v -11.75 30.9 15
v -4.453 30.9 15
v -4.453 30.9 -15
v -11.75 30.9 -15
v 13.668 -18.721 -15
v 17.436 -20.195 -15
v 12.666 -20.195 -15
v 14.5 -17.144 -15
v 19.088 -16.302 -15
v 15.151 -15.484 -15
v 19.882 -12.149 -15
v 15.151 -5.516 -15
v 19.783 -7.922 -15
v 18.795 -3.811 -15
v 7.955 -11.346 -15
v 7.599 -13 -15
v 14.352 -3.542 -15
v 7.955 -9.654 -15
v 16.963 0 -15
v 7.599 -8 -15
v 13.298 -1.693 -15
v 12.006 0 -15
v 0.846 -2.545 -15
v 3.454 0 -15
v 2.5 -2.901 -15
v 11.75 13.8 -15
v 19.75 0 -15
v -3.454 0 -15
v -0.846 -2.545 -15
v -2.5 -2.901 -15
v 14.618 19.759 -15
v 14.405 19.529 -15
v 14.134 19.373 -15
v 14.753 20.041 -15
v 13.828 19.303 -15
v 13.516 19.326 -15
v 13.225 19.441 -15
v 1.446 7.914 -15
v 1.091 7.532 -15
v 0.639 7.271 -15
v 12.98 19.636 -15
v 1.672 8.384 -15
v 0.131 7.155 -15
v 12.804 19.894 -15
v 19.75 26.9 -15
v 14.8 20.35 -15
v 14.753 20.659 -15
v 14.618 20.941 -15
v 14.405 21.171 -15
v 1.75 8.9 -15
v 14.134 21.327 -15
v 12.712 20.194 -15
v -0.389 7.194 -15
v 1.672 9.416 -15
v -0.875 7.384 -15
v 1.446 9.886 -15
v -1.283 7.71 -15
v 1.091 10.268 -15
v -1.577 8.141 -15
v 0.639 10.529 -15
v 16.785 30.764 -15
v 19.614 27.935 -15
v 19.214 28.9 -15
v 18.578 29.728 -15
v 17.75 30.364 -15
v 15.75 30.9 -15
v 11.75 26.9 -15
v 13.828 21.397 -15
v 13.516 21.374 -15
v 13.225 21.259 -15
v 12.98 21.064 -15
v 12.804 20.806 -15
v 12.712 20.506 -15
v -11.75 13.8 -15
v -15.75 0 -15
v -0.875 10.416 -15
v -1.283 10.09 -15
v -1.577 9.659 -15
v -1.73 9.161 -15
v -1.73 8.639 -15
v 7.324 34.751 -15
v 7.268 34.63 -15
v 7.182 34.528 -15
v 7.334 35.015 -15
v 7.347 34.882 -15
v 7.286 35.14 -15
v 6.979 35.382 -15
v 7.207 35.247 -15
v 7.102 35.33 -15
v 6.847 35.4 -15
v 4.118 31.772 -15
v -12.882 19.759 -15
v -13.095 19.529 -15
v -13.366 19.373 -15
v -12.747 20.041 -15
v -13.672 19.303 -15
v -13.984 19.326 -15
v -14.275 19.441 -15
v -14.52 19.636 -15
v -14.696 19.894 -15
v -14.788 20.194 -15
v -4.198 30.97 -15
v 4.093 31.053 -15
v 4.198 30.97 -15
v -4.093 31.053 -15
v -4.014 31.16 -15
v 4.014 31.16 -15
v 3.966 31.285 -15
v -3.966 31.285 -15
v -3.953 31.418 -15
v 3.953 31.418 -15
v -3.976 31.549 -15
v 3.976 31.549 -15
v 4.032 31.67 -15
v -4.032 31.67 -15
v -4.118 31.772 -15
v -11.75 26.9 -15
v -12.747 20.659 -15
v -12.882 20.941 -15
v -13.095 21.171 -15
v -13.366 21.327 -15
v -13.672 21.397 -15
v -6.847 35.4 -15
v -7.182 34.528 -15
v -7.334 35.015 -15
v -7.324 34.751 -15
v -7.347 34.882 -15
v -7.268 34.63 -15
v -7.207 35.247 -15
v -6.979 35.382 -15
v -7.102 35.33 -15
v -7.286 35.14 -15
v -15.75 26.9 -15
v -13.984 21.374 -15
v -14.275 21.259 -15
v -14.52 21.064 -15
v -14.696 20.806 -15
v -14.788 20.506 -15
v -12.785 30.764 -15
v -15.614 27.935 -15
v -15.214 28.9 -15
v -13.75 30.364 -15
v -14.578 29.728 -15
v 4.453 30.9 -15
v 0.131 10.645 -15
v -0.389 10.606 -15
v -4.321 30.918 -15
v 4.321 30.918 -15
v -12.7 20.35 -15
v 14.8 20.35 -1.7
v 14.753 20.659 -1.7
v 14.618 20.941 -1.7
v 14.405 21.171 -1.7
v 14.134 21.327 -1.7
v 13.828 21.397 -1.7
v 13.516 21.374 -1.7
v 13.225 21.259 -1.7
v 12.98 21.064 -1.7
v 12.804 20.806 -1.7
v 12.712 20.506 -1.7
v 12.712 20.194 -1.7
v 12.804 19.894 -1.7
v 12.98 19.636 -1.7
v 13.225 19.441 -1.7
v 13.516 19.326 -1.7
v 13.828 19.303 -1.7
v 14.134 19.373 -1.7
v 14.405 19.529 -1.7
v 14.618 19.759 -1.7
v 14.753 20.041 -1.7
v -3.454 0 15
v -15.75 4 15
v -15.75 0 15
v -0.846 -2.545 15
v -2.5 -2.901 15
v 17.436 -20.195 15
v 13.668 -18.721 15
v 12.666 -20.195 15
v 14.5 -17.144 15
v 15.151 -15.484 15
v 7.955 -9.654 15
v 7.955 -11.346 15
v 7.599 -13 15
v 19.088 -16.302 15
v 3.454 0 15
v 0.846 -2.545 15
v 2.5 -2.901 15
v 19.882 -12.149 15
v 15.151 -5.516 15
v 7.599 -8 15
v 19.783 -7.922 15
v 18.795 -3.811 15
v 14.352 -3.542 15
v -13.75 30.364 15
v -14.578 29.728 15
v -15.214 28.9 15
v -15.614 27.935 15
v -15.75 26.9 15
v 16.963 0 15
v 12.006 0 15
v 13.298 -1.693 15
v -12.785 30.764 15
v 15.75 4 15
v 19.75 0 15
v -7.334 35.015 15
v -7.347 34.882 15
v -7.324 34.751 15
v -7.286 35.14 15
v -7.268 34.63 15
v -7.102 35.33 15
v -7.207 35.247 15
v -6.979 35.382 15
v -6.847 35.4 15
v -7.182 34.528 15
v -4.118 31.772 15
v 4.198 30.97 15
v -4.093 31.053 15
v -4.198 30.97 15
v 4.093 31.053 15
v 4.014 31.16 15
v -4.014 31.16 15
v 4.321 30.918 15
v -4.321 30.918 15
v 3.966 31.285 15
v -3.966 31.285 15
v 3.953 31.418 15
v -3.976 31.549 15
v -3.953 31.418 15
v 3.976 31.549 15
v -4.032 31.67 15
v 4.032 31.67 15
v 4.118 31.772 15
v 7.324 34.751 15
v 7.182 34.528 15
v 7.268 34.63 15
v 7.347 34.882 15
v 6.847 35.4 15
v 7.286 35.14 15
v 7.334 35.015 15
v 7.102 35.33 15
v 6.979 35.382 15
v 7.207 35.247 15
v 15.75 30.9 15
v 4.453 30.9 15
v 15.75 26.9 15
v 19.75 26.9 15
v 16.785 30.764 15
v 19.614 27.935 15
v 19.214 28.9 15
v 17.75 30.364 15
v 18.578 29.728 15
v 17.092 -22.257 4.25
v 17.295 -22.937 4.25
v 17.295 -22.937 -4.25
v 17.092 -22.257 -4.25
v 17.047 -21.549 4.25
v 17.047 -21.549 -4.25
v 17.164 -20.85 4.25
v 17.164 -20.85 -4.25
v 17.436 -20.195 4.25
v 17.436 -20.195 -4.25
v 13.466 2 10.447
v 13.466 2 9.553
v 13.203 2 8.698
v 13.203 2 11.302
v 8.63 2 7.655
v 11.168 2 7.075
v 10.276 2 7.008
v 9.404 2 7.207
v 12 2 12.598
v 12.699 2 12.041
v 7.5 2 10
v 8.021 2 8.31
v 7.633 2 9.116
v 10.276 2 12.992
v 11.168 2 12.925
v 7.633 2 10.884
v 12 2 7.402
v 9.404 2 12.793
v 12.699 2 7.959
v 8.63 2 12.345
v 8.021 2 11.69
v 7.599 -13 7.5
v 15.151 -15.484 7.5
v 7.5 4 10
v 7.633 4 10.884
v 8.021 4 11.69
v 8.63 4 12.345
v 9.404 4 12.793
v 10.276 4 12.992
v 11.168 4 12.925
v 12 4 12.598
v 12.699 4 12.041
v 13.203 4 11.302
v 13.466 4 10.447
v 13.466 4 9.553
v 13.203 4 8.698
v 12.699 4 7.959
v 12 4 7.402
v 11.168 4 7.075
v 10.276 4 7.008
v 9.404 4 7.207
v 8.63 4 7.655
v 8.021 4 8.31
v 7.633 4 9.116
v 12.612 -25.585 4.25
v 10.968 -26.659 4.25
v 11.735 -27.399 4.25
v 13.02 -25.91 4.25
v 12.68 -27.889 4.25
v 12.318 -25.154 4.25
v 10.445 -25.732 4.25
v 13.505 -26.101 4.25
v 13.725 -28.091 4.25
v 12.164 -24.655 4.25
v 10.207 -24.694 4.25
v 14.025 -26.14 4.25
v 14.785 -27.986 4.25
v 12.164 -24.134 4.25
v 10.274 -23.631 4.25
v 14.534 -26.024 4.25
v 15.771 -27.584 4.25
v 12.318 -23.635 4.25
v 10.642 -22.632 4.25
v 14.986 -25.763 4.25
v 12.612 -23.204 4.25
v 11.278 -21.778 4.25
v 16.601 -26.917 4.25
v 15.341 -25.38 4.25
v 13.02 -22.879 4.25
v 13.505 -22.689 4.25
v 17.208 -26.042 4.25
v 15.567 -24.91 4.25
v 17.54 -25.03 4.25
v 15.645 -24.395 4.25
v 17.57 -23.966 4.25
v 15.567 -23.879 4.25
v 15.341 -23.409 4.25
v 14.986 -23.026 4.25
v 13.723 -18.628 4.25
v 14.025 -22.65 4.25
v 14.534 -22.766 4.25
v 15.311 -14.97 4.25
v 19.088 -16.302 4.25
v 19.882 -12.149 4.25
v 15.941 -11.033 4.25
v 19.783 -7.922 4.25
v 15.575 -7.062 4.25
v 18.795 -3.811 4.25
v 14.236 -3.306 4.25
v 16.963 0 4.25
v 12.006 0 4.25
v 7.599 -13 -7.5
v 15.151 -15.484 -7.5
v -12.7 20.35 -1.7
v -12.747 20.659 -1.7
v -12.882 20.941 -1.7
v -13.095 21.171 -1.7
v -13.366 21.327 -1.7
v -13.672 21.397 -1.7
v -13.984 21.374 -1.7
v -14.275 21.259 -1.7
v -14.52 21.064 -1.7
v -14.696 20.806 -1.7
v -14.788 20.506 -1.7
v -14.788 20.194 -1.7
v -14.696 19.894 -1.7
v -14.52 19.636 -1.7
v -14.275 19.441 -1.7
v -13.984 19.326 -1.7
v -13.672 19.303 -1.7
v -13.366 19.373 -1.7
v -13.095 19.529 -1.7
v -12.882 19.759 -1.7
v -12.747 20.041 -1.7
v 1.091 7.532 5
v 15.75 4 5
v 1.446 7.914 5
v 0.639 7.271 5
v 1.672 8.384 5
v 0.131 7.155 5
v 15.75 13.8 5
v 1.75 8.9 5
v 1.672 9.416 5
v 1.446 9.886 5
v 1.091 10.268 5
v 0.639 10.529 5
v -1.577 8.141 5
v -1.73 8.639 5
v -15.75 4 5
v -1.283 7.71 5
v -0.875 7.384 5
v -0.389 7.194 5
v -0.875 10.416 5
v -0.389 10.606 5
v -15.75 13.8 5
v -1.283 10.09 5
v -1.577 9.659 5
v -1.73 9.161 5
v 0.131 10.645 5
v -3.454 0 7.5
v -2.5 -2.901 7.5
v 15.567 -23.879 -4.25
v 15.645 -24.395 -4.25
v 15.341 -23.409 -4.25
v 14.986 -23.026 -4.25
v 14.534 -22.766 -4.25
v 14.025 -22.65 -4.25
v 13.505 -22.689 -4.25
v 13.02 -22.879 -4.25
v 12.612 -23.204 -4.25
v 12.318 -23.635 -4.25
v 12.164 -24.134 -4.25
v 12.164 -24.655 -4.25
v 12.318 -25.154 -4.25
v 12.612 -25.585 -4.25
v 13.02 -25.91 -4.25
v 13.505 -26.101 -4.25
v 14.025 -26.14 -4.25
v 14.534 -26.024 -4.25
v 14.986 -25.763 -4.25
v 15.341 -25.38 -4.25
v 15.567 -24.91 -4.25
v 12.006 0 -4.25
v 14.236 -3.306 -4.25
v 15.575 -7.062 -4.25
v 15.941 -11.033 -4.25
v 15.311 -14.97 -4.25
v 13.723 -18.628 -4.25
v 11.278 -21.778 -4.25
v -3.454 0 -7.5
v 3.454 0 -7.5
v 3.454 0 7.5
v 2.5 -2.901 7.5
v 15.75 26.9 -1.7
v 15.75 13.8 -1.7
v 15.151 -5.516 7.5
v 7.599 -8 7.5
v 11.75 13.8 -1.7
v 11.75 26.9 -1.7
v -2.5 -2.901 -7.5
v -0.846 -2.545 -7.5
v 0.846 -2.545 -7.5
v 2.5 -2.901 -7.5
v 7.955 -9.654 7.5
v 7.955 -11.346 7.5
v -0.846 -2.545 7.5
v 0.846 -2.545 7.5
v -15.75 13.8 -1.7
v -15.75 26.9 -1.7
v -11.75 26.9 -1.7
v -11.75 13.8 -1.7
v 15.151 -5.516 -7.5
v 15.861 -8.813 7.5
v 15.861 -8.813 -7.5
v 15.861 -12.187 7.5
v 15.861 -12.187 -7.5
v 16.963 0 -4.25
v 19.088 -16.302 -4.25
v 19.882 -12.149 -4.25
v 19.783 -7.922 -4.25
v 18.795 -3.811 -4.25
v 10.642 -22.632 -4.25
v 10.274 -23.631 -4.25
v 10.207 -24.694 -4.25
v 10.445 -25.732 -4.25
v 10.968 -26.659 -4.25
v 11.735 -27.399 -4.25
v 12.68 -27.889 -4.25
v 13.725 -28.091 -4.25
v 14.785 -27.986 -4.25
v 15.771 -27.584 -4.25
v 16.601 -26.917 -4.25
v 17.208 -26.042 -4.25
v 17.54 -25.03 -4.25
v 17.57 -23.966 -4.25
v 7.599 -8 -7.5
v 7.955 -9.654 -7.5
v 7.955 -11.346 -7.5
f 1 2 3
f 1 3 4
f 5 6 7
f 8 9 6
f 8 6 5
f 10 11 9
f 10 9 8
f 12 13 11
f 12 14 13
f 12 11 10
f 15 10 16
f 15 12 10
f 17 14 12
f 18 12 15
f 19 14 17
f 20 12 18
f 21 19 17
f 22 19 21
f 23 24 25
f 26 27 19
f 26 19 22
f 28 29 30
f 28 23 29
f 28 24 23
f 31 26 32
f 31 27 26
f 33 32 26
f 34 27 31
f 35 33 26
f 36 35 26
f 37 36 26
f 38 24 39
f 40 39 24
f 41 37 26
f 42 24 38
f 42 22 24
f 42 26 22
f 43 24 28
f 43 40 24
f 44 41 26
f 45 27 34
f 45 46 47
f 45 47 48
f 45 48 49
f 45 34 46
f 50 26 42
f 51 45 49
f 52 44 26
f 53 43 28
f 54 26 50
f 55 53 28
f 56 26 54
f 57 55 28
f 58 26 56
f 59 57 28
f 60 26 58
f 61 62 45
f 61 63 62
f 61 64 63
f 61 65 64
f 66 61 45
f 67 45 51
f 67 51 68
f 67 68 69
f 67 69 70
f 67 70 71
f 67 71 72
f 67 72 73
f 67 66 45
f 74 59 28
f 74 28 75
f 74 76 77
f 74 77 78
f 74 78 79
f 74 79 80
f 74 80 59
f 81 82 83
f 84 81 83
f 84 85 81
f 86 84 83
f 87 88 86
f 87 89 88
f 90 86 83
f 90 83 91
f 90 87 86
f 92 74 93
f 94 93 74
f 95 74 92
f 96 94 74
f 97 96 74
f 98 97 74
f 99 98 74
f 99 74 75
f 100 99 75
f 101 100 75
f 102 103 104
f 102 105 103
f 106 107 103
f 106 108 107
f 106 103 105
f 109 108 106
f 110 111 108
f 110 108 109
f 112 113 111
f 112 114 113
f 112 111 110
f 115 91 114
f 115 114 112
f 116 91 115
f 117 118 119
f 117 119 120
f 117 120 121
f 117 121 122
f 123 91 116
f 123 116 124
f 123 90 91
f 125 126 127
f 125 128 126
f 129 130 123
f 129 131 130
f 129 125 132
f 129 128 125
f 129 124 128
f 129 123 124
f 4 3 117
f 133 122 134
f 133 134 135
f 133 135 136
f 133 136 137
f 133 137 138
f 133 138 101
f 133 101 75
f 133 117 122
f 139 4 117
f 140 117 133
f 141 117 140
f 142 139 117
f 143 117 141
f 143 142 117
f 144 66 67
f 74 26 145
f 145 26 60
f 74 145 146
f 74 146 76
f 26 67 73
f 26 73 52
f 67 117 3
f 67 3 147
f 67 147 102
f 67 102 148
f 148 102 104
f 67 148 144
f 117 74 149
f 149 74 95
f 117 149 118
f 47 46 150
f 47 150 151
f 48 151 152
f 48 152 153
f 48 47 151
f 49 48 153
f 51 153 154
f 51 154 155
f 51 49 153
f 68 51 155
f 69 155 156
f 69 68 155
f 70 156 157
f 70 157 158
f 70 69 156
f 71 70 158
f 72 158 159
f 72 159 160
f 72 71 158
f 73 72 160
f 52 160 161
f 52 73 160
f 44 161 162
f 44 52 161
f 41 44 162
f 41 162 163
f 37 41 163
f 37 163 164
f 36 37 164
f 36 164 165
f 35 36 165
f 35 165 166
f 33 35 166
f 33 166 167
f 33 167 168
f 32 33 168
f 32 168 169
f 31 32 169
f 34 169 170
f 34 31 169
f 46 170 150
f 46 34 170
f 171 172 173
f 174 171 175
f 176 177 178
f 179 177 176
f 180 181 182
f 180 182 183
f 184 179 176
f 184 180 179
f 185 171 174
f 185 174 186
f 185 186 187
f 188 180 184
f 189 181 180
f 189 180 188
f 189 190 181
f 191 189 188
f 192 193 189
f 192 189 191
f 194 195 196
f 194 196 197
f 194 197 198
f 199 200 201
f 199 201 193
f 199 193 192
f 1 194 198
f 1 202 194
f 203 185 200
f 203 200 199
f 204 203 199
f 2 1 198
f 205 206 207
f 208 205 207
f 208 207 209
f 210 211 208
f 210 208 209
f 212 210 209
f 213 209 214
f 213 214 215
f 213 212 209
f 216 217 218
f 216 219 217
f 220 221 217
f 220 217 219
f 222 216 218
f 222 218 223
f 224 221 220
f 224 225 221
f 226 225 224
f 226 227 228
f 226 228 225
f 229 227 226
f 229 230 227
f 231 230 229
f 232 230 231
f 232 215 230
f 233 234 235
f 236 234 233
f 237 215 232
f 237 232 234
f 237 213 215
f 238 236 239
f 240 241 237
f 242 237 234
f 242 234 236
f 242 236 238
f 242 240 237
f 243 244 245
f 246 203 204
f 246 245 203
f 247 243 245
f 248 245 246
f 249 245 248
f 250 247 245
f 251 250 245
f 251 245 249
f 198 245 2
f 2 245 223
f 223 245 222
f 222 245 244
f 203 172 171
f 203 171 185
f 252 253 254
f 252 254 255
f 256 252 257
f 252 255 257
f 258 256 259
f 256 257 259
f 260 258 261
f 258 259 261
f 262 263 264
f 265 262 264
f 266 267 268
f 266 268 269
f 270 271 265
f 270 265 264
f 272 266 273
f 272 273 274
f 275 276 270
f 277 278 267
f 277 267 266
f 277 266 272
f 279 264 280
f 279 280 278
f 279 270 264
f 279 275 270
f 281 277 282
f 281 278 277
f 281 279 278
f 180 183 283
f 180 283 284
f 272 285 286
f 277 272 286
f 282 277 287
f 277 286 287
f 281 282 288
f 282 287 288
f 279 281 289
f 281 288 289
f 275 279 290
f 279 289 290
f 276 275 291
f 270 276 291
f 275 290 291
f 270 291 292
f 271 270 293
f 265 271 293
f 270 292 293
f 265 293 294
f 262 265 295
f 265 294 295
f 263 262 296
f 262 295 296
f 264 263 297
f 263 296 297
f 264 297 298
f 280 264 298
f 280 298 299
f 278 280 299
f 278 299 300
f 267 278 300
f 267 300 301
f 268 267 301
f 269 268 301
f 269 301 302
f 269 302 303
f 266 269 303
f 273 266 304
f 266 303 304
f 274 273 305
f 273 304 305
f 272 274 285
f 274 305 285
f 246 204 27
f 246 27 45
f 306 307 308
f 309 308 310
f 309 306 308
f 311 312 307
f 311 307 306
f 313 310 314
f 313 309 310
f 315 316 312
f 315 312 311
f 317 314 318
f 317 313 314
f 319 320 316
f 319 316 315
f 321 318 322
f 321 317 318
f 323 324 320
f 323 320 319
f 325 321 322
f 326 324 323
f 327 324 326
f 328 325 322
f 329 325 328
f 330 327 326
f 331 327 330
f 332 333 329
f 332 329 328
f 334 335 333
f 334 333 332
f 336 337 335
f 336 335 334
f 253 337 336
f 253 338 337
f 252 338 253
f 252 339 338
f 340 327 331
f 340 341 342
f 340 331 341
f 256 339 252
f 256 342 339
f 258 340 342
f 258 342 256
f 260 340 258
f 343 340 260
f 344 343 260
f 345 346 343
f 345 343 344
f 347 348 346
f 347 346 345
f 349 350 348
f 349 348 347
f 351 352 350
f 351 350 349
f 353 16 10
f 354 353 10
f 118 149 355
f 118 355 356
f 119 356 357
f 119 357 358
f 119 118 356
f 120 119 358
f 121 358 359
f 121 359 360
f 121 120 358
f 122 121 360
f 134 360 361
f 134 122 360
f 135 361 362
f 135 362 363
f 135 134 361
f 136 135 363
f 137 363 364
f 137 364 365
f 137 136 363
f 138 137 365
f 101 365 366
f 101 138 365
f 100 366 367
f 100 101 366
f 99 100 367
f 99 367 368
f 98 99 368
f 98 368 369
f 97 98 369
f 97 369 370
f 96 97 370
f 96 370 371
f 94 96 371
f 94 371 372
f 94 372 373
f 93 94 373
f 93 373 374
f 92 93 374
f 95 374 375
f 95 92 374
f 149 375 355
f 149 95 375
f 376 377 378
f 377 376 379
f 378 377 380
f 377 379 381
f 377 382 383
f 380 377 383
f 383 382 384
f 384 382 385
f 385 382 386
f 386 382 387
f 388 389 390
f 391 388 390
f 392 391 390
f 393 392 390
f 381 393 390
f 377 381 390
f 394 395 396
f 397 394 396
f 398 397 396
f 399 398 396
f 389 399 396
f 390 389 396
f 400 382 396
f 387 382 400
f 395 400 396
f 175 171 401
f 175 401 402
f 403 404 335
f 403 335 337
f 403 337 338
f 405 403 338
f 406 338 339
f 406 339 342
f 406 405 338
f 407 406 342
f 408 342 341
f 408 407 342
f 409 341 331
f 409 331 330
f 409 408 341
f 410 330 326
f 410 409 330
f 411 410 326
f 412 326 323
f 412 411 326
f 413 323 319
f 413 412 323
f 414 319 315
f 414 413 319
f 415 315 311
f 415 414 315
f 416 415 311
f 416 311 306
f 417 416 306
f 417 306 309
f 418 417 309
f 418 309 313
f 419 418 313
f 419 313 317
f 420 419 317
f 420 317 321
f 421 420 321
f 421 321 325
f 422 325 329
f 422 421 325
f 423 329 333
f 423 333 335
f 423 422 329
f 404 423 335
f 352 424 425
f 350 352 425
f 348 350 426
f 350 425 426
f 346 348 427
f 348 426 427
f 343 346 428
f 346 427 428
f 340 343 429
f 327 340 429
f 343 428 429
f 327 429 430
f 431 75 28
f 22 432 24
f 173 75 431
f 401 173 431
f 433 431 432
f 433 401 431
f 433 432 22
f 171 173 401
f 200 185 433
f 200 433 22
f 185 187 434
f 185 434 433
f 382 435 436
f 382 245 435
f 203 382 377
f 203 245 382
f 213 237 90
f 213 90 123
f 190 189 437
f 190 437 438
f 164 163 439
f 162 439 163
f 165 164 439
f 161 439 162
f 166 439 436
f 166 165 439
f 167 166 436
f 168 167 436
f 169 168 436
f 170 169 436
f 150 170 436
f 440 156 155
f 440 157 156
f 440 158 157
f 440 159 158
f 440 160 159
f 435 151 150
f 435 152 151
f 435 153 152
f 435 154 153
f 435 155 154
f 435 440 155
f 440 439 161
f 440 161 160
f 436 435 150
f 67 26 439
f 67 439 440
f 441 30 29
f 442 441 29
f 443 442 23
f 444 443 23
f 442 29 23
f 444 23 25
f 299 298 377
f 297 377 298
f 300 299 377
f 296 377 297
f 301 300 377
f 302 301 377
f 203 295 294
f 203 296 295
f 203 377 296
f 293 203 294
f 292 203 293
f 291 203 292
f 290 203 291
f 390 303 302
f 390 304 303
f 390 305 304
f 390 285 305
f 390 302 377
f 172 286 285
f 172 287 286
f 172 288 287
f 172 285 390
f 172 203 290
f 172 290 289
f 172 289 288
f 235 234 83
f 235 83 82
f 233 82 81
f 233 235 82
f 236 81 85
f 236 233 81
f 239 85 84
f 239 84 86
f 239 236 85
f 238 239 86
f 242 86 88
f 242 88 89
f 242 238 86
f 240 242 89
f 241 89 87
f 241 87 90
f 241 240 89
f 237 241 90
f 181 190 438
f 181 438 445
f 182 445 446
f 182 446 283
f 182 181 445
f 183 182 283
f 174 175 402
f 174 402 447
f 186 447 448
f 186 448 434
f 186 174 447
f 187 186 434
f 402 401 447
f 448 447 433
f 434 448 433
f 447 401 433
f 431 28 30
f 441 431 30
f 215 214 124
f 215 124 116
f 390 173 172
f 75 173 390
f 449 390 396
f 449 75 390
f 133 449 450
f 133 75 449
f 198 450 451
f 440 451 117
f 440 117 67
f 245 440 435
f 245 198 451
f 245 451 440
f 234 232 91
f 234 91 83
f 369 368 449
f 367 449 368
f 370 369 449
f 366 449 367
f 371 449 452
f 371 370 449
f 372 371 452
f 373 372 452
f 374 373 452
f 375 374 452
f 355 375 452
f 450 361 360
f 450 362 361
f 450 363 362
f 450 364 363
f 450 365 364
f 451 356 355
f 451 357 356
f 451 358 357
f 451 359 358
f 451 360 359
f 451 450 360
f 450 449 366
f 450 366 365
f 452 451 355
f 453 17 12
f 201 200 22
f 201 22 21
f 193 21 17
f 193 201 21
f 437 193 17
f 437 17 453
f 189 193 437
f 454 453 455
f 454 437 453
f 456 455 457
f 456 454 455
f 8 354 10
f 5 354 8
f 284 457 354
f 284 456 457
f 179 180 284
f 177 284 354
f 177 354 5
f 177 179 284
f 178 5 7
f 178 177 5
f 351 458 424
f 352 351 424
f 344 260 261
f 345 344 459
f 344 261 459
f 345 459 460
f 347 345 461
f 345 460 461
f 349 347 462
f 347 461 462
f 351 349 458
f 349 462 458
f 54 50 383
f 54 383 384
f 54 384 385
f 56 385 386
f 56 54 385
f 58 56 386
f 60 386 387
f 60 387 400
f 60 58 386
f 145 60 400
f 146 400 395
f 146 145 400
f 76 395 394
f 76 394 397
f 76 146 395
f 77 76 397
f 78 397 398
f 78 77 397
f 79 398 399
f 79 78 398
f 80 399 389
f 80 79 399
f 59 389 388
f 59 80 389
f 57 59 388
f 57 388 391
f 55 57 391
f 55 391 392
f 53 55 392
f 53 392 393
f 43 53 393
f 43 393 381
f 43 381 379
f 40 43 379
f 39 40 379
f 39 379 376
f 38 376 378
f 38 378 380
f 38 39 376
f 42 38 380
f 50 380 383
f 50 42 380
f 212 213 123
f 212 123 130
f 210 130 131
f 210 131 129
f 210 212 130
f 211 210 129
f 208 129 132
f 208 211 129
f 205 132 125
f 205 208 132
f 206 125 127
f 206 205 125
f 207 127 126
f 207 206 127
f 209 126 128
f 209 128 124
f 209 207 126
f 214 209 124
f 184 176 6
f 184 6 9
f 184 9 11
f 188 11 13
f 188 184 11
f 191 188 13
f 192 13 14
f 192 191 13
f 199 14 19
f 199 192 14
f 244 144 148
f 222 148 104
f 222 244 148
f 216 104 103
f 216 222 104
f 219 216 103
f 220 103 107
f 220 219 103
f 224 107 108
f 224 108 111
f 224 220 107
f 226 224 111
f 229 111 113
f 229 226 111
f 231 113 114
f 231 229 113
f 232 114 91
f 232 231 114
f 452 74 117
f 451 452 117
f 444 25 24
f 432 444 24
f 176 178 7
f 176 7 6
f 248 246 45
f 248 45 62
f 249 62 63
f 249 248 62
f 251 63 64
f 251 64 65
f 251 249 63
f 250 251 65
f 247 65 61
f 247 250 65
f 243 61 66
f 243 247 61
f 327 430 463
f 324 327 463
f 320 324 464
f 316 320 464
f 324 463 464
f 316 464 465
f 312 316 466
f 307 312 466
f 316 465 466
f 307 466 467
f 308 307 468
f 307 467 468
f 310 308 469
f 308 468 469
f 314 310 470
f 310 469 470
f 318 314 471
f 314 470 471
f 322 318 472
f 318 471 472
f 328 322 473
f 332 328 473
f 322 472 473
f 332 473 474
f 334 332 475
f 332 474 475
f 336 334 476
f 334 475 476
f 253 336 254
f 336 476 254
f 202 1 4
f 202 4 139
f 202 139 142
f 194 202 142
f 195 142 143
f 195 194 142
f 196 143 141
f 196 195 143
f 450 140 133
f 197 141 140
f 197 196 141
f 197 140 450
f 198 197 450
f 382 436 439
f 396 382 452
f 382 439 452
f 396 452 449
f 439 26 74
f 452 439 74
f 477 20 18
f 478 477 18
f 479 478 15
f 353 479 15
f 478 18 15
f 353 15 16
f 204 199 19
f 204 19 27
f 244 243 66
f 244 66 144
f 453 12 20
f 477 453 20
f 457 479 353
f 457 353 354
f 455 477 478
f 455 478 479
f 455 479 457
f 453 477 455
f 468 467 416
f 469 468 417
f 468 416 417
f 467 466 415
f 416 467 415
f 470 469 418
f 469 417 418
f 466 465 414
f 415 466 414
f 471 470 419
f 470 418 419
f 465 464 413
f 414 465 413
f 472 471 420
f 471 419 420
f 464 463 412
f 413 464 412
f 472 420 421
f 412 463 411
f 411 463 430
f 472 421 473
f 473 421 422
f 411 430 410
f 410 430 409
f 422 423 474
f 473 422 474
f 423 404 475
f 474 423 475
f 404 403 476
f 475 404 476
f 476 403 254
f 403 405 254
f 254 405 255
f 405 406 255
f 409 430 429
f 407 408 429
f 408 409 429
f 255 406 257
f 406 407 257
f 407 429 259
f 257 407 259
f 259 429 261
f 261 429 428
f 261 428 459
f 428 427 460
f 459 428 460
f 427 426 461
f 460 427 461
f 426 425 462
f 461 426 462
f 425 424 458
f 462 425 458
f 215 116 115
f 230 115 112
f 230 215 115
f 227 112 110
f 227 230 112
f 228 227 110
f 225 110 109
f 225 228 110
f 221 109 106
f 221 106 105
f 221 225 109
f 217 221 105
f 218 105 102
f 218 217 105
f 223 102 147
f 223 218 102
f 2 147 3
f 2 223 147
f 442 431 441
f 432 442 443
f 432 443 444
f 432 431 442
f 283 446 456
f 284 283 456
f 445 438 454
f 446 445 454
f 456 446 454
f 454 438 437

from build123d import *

# Parameters (mm, degrees)
EXTRUDE_1_DEPTH     = 15
EXTRUDE_START       = -4.25
EXTRUDE_2_OUTLINE_R = 1.75
EXTRUDE_2_DEPTH     = 8.5
EXTRUDE_START_2     = -15
SKETCH_1_4_W        = 4
SKETCH_1_4_H        = 13.1
SKETCH_1_4_R        = 1.05
EXTRUDE_3_DEPTH     = 13.3
SKETCH_1_6_R        = 1.75
EXTRUDE_5_DEPTH     = 20
EXTRUDE_START_3     = 15
EXTRUDE_6_DEPTH     = 7.5
EXTRUDE_7_DEPTH     = 7.5
SKETCH_2_R          = 3
CUT_EXTRUDE_1_DEPTH = 2


# Read off the part's stored shape, not the designer's step: Бобышка-Вытянуть2
with BuildPart() as part:
    # Эскиз1 → Бобышка-Вытянуть1 (new, symmetric)
    with BuildSketch(Plane.XY):
        with BuildLine():
            Line((-15.75, 4), (-15.75, 0))
            Line((-15.75, 0), (12.006352485, 0))
            ThreePointArc((12.006352485, 0), (15.941509182, -9.979629936), (12.665555468, -20.19464825))
            Line((12.665555468, -20.19464825), (17.436063068, -20.19464825))
            ThreePointArc((17.436063068, -20.19464825), (19.944534806, -10.033061691), (16.963269142, 0))
            Line((16.963269142, 0), (19.75, 0))
            Line((19.75, 0), (19.75, 26.9))
            ThreePointArc((19.75, 26.9), (18.578427125, 29.728427125), (15.75, 30.9))
            Line((15.75, 30.9), (4.452979114, 30.9))
            ThreePointArc((4.452979114, 30.9), (3.986168908, 31.220868116), (4.118496748, 31.771647073))
            Line((4.118496748, 31.771647073), (7.181503252, 34.528352927))
            ThreePointArc((7.181503252, 34.528352927), (7.313831092, 35.079131884), (6.847020886, 35.4))
            Line((6.847020886, 35.4), (-6.847020886, 35.4))
            ThreePointArc((-6.847020886, 35.4), (-7.313831092, 35.079131884), (-7.181503252, 34.528352927))
            Line((-7.181503252, 34.528352927), (-4.118496748, 31.771647073))
            ThreePointArc((-4.118496748, 31.771647073), (-3.986168908, 31.220868116), (-4.452979114, 30.9))
            Line((-4.452979114, 30.9), (-11.75, 30.9))
            ThreePointArc((-11.75, 30.9), (-14.578427125, 29.728427125), (-15.75, 26.9))
            Line((-15.75, 26.9), (15.75, 26.9))
            Line((15.75, 26.9), (15.75, 4))
            Line((15.75, 4), (-15.75, 4))
        make_face()
    extrude(amount=EXTRUDE_1_DEPTH, both=True)

    # Эскиз1<4> → Бобышка-Вытянуть3 (add)
    # profile 1 of 2: a face of its own
    with BuildSketch(Plane.XY.offset(EXTRUDE_START_2)):
        with Locations((-13.75, 20.35)):
            Rectangle(SKETCH_1_4_W, SKETCH_1_4_H)
        with Locations((-13.75, 20.35)):
            Circle(SKETCH_1_4_R, mode=Mode.SUBTRACT)
    # profile 2 of 2: a face of its own
    with BuildSketch(Plane.XY.offset(EXTRUDE_START_2)):
        with Locations((13.75, 20.35)):
            Rectangle(SKETCH_1_4_W, SKETCH_1_4_H)
        with Locations((13.75, 20.35)):
            Circle(SKETCH_1_4_R, mode=Mode.SUBTRACT)
    extrude(amount=EXTRUDE_3_DEPTH)

    # Эскиз1<6> → Бобышка-Вытянуть5 (add)
    with BuildSketch(Plane.XY.offset(EXTRUDE_START_2)):
        Polygon((-11.75, 13.8), (11.75, 13.8), (15.75, 13.8), (15.75, 4), (-15.75, 4), (-15.75, 13.8), align=None)
        with Locations((0, 8.9)):
            Circle(SKETCH_1_6_R, mode=Mode.SUBTRACT)
    extrude(amount=EXTRUDE_5_DEPTH)

    # Эскиз1<7> → Бобышка-Вытянуть6 (add)
    with BuildSketch(Plane.XY.offset(EXTRUDE_START_3)):
        with BuildLine():
            Line((3.454246399, 0), (-3.454246399, 0))
            Line((-3.454246399, 0), (-2.5, -2.900657923))
            ThreePointArc((-2.5, -2.900657923), (0, -2.5), (2.5, -2.900657923))
            Line((2.5, -2.900657923), (3.454246399, 0))
        make_face()
        with BuildLine():
            ThreePointArc((15.151188266, -15.484375), (15.95, -10.5), (15.151188266, -5.515625))
            Line((15.151188266, -5.515625), (7.599342077, -8))
            ThreePointArc((7.599342077, -8), (8, -10.5), (7.599342077, -13))
            Line((7.599342077, -13), (15.151188266, -15.484375))
        make_face()
    extrude(amount=-EXTRUDE_6_DEPTH)

    # Эскиз1<8> → Бобышка-Вытянуть7 (add)
    with BuildSketch(Plane.XY.offset(EXTRUDE_START_2)):
        with BuildLine():
            Line((3.454246399, 0), (-3.454246399, 0))
            Line((-3.454246399, 0), (-2.5, -2.900657923))
            ThreePointArc((-2.5, -2.900657923), (0, -2.5), (2.5, -2.900657923))
            Line((2.5, -2.900657923), (3.454246399, 0))
        make_face()
        with BuildLine():
            ThreePointArc((15.151188266, -15.484375), (15.95, -10.5), (15.151188266, -5.515625))
            Line((15.151188266, -5.515625), (7.599342077, -8))
            ThreePointArc((7.599342077, -8), (8, -10.5), (7.599342077, -13))
            Line((7.599342077, -13), (15.151188266, -15.484375))
        make_face()
    extrude(amount=EXTRUDE_7_DEPTH)

    # Эскиз2 → Вырез-Вытянуть1 (cut)
    with BuildSketch(Plane(origin=(0, 4, 0), x_dir=(1, 0, 0), z_dir=(0, 1, 0))):
        with Locations(Location((10.5, -10, 0), (0, 0, 180))):
            Circle(SKETCH_2_R)
    extrude(amount=-CUT_EXTRUDE_1_DEPTH, mode=Mode.SUBTRACT)


with BuildPart() as body_2:
    # Бобышка-Вытянуть2 outline → Бобышка-Вытянуть2 (new body)
    with BuildSketch(Plane.XY.offset(EXTRUDE_START)):
        with BuildLine():
            ThreePointArc((11.27835316, -21.77835316), (13.195055264, -28.02790707), (17.295400741, -22.936950579))
            ThreePointArc((17.295400741, -22.936950579), (17.047434126, -21.549472802), (17.436063068, -20.19464825))
            ThreePointArc((17.436063068, -20.19464825), (19.944534806, -10.033061691), (16.963269142, 0))
            Line((16.963269142, 0), (12.006352485, 0))
            ThreePointArc((12.006352485, 0), (15.94109613, -11.032873498), (11.27835316, -21.77835316))
        make_face()
        with Locations((13.89464825, -24.39464825)):
            Circle(EXTRUDE_2_OUTLINE_R, mode=Mode.SUBTRACT)
    extrude(amount=EXTRUDE_2_DEPTH)


solid = Compound([part.part, body_2.part])
